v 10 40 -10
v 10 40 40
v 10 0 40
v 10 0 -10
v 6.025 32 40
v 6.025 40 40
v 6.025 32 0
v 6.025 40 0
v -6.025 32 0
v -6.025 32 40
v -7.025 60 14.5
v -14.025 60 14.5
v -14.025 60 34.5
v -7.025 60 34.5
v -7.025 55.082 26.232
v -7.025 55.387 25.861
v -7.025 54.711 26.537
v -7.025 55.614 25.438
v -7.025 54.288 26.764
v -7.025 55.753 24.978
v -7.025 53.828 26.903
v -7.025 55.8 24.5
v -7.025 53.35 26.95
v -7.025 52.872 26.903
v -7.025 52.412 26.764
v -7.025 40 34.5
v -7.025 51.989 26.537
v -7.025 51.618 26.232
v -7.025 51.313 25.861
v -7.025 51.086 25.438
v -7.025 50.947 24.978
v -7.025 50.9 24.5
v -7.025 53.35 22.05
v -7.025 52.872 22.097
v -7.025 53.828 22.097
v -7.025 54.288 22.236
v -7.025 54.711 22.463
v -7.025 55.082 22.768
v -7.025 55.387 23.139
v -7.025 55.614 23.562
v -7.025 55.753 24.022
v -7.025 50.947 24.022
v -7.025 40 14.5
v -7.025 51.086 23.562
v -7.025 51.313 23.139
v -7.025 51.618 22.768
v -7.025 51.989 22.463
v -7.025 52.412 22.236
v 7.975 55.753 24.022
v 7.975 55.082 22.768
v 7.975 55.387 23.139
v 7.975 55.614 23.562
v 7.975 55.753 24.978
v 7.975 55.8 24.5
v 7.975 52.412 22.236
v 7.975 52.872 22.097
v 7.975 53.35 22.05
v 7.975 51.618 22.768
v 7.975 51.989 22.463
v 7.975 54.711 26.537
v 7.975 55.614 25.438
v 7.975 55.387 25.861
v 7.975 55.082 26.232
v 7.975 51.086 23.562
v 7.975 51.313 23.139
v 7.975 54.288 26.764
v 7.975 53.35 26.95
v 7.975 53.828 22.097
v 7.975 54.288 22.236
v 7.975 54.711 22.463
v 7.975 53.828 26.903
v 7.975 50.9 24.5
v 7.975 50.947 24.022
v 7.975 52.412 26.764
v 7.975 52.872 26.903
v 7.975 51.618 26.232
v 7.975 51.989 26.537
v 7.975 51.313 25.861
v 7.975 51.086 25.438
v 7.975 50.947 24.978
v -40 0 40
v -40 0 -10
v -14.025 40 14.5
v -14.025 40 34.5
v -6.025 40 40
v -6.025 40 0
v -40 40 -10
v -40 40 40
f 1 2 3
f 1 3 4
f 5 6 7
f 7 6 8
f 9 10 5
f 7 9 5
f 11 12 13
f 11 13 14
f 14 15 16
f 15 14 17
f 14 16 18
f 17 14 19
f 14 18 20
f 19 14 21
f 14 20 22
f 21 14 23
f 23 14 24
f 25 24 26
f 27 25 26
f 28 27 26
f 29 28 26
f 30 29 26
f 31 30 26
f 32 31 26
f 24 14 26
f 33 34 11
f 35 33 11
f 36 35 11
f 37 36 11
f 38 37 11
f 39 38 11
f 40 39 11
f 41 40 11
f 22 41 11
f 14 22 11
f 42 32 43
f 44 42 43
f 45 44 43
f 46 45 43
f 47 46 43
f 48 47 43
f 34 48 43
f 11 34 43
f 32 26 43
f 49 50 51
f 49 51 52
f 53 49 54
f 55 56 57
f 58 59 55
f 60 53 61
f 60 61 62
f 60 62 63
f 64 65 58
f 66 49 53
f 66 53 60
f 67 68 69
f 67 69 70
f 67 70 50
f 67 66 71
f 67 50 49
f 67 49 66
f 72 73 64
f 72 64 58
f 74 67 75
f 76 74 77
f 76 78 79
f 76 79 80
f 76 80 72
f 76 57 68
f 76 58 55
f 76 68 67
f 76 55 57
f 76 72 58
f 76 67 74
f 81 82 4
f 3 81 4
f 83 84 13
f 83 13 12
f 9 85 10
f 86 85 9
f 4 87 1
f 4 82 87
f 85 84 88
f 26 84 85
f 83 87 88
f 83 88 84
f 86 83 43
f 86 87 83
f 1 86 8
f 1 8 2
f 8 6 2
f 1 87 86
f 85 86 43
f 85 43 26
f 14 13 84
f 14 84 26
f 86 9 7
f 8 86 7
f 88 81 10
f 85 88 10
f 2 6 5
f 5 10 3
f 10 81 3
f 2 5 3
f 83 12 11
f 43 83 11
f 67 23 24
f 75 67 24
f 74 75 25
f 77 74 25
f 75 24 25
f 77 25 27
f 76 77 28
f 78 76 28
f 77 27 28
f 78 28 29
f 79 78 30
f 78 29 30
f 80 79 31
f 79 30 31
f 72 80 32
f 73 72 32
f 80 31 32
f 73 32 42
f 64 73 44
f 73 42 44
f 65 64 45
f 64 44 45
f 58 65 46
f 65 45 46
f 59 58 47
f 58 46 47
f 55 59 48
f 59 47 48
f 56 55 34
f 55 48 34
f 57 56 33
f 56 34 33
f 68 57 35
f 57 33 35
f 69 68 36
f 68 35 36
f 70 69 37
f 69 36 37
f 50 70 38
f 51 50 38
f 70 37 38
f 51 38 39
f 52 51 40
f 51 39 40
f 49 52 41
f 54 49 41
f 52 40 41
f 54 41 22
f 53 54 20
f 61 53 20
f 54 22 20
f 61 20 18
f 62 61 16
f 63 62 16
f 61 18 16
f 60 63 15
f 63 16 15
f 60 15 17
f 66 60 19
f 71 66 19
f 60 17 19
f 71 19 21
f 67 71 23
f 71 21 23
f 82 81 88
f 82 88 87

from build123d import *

# Parameters (mm, degrees)
SKETCH1_W           = 80
SKETCH1_H           = 80
BOSS_EXTRUDE1_DEPTH = 40
SKETCH2_W           = 12.05
SKETCH2_H           = 80
CUT_EXTRUDE1_DEPTH  = 8
SKETCH3_W           = 7
SKETCH3_H           = 20
BOSS_EXTRUDE2_DEPTH = 20
SKETCH4_R           = 2.45
BOSS_EXTRUDE3_DEPTH = 15
SKETCH6_W           = 80
SKETCH6_H           = 40
CUT_EXTRUDE3_DEPTH  = 30
SKETCH7_W           = 50
SKETCH7_H           = 40
CUT_EXTRUDE4_DEPTH  = 30
SKETCH8_W           = 12.05
SKETCH8_H           = 10
BOSS_EXTRUDE4_DEPTH = 8


with BuildPart() as part:
    # Sketch1 → Boss-Extrude1 (new body)
    with BuildSketch(Plane(origin=(0, 0, 0), x_dir=(1, 0, 0), z_dir=(0, 1, 0))):
        Rectangle(SKETCH1_W, SKETCH1_H)
    extrude(amount=BOSS_EXTRUDE1_DEPTH)

    # Sketch2 → Cut-Extrude1 (cut)
    with BuildSketch(Plane(origin=(0, 40, 0), x_dir=(1, 0, 0), z_dir=(0, 1, 0))):
        Rectangle(SKETCH2_W, SKETCH2_H)
    extrude(amount=-CUT_EXTRUDE1_DEPTH, mode=Mode.SUBTRACT)

    # Sketch3 → Boss-Extrude2 (add)
    with BuildSketch(Plane(origin=(0, 40, 0), x_dir=(1, 0, 0), z_dir=(0, 1, 0))):
        with Locations((-10.525, -24.5)):
            Rectangle(SKETCH3_W, SKETCH3_H)
    extrude(amount=BOSS_EXTRUDE2_DEPTH)

    # Sketch4 → Boss-Extrude3 (add)
    with BuildSketch(Plane(origin=(-7.025, 0, 0), x_dir=(0, 0, -1), z_dir=(1, 0, 0))):
        with Locations(Location((-24.5, 53.35, 0), (0, 0, 180))):
            Circle(SKETCH4_R)
    extrude(amount=BOSS_EXTRUDE3_DEPTH)

    # Sketch6 → Cut-Extrude3 (cut)
    with BuildSketch(Plane(origin=(0, 0, -40), x_dir=(-1, 0, 0), z_dir=(0, 0, -1))):
        with Locations((0, 20)):
            Rectangle(SKETCH6_W, SKETCH6_H)
    extrude(amount=-CUT_EXTRUDE3_DEPTH, mode=Mode.SUBTRACT)

    # Sketch7 → Cut-Extrude4 (cut)
    with BuildSketch(Plane(origin=(40, 0, 0), x_dir=(0, 0, -1), z_dir=(1, 0, 0))):
        with Locations((-15, 20)):
            Rectangle(SKETCH7_W, SKETCH7_H)
    extrude(amount=-CUT_EXTRUDE4_DEPTH, mode=Mode.SUBTRACT)

    # Sketch8 → Boss-Extrude4 (add)
    with BuildSketch(Plane(origin=(0, 32, 0), x_dir=(1, 0, 0), z_dir=(0, 1, 0))):
        with Locations((0, 5)):
            Rectangle(SKETCH8_W, SKETCH8_H)
    extrude(amount=BOSS_EXTRUDE4_DEPTH)


solid = part.part
